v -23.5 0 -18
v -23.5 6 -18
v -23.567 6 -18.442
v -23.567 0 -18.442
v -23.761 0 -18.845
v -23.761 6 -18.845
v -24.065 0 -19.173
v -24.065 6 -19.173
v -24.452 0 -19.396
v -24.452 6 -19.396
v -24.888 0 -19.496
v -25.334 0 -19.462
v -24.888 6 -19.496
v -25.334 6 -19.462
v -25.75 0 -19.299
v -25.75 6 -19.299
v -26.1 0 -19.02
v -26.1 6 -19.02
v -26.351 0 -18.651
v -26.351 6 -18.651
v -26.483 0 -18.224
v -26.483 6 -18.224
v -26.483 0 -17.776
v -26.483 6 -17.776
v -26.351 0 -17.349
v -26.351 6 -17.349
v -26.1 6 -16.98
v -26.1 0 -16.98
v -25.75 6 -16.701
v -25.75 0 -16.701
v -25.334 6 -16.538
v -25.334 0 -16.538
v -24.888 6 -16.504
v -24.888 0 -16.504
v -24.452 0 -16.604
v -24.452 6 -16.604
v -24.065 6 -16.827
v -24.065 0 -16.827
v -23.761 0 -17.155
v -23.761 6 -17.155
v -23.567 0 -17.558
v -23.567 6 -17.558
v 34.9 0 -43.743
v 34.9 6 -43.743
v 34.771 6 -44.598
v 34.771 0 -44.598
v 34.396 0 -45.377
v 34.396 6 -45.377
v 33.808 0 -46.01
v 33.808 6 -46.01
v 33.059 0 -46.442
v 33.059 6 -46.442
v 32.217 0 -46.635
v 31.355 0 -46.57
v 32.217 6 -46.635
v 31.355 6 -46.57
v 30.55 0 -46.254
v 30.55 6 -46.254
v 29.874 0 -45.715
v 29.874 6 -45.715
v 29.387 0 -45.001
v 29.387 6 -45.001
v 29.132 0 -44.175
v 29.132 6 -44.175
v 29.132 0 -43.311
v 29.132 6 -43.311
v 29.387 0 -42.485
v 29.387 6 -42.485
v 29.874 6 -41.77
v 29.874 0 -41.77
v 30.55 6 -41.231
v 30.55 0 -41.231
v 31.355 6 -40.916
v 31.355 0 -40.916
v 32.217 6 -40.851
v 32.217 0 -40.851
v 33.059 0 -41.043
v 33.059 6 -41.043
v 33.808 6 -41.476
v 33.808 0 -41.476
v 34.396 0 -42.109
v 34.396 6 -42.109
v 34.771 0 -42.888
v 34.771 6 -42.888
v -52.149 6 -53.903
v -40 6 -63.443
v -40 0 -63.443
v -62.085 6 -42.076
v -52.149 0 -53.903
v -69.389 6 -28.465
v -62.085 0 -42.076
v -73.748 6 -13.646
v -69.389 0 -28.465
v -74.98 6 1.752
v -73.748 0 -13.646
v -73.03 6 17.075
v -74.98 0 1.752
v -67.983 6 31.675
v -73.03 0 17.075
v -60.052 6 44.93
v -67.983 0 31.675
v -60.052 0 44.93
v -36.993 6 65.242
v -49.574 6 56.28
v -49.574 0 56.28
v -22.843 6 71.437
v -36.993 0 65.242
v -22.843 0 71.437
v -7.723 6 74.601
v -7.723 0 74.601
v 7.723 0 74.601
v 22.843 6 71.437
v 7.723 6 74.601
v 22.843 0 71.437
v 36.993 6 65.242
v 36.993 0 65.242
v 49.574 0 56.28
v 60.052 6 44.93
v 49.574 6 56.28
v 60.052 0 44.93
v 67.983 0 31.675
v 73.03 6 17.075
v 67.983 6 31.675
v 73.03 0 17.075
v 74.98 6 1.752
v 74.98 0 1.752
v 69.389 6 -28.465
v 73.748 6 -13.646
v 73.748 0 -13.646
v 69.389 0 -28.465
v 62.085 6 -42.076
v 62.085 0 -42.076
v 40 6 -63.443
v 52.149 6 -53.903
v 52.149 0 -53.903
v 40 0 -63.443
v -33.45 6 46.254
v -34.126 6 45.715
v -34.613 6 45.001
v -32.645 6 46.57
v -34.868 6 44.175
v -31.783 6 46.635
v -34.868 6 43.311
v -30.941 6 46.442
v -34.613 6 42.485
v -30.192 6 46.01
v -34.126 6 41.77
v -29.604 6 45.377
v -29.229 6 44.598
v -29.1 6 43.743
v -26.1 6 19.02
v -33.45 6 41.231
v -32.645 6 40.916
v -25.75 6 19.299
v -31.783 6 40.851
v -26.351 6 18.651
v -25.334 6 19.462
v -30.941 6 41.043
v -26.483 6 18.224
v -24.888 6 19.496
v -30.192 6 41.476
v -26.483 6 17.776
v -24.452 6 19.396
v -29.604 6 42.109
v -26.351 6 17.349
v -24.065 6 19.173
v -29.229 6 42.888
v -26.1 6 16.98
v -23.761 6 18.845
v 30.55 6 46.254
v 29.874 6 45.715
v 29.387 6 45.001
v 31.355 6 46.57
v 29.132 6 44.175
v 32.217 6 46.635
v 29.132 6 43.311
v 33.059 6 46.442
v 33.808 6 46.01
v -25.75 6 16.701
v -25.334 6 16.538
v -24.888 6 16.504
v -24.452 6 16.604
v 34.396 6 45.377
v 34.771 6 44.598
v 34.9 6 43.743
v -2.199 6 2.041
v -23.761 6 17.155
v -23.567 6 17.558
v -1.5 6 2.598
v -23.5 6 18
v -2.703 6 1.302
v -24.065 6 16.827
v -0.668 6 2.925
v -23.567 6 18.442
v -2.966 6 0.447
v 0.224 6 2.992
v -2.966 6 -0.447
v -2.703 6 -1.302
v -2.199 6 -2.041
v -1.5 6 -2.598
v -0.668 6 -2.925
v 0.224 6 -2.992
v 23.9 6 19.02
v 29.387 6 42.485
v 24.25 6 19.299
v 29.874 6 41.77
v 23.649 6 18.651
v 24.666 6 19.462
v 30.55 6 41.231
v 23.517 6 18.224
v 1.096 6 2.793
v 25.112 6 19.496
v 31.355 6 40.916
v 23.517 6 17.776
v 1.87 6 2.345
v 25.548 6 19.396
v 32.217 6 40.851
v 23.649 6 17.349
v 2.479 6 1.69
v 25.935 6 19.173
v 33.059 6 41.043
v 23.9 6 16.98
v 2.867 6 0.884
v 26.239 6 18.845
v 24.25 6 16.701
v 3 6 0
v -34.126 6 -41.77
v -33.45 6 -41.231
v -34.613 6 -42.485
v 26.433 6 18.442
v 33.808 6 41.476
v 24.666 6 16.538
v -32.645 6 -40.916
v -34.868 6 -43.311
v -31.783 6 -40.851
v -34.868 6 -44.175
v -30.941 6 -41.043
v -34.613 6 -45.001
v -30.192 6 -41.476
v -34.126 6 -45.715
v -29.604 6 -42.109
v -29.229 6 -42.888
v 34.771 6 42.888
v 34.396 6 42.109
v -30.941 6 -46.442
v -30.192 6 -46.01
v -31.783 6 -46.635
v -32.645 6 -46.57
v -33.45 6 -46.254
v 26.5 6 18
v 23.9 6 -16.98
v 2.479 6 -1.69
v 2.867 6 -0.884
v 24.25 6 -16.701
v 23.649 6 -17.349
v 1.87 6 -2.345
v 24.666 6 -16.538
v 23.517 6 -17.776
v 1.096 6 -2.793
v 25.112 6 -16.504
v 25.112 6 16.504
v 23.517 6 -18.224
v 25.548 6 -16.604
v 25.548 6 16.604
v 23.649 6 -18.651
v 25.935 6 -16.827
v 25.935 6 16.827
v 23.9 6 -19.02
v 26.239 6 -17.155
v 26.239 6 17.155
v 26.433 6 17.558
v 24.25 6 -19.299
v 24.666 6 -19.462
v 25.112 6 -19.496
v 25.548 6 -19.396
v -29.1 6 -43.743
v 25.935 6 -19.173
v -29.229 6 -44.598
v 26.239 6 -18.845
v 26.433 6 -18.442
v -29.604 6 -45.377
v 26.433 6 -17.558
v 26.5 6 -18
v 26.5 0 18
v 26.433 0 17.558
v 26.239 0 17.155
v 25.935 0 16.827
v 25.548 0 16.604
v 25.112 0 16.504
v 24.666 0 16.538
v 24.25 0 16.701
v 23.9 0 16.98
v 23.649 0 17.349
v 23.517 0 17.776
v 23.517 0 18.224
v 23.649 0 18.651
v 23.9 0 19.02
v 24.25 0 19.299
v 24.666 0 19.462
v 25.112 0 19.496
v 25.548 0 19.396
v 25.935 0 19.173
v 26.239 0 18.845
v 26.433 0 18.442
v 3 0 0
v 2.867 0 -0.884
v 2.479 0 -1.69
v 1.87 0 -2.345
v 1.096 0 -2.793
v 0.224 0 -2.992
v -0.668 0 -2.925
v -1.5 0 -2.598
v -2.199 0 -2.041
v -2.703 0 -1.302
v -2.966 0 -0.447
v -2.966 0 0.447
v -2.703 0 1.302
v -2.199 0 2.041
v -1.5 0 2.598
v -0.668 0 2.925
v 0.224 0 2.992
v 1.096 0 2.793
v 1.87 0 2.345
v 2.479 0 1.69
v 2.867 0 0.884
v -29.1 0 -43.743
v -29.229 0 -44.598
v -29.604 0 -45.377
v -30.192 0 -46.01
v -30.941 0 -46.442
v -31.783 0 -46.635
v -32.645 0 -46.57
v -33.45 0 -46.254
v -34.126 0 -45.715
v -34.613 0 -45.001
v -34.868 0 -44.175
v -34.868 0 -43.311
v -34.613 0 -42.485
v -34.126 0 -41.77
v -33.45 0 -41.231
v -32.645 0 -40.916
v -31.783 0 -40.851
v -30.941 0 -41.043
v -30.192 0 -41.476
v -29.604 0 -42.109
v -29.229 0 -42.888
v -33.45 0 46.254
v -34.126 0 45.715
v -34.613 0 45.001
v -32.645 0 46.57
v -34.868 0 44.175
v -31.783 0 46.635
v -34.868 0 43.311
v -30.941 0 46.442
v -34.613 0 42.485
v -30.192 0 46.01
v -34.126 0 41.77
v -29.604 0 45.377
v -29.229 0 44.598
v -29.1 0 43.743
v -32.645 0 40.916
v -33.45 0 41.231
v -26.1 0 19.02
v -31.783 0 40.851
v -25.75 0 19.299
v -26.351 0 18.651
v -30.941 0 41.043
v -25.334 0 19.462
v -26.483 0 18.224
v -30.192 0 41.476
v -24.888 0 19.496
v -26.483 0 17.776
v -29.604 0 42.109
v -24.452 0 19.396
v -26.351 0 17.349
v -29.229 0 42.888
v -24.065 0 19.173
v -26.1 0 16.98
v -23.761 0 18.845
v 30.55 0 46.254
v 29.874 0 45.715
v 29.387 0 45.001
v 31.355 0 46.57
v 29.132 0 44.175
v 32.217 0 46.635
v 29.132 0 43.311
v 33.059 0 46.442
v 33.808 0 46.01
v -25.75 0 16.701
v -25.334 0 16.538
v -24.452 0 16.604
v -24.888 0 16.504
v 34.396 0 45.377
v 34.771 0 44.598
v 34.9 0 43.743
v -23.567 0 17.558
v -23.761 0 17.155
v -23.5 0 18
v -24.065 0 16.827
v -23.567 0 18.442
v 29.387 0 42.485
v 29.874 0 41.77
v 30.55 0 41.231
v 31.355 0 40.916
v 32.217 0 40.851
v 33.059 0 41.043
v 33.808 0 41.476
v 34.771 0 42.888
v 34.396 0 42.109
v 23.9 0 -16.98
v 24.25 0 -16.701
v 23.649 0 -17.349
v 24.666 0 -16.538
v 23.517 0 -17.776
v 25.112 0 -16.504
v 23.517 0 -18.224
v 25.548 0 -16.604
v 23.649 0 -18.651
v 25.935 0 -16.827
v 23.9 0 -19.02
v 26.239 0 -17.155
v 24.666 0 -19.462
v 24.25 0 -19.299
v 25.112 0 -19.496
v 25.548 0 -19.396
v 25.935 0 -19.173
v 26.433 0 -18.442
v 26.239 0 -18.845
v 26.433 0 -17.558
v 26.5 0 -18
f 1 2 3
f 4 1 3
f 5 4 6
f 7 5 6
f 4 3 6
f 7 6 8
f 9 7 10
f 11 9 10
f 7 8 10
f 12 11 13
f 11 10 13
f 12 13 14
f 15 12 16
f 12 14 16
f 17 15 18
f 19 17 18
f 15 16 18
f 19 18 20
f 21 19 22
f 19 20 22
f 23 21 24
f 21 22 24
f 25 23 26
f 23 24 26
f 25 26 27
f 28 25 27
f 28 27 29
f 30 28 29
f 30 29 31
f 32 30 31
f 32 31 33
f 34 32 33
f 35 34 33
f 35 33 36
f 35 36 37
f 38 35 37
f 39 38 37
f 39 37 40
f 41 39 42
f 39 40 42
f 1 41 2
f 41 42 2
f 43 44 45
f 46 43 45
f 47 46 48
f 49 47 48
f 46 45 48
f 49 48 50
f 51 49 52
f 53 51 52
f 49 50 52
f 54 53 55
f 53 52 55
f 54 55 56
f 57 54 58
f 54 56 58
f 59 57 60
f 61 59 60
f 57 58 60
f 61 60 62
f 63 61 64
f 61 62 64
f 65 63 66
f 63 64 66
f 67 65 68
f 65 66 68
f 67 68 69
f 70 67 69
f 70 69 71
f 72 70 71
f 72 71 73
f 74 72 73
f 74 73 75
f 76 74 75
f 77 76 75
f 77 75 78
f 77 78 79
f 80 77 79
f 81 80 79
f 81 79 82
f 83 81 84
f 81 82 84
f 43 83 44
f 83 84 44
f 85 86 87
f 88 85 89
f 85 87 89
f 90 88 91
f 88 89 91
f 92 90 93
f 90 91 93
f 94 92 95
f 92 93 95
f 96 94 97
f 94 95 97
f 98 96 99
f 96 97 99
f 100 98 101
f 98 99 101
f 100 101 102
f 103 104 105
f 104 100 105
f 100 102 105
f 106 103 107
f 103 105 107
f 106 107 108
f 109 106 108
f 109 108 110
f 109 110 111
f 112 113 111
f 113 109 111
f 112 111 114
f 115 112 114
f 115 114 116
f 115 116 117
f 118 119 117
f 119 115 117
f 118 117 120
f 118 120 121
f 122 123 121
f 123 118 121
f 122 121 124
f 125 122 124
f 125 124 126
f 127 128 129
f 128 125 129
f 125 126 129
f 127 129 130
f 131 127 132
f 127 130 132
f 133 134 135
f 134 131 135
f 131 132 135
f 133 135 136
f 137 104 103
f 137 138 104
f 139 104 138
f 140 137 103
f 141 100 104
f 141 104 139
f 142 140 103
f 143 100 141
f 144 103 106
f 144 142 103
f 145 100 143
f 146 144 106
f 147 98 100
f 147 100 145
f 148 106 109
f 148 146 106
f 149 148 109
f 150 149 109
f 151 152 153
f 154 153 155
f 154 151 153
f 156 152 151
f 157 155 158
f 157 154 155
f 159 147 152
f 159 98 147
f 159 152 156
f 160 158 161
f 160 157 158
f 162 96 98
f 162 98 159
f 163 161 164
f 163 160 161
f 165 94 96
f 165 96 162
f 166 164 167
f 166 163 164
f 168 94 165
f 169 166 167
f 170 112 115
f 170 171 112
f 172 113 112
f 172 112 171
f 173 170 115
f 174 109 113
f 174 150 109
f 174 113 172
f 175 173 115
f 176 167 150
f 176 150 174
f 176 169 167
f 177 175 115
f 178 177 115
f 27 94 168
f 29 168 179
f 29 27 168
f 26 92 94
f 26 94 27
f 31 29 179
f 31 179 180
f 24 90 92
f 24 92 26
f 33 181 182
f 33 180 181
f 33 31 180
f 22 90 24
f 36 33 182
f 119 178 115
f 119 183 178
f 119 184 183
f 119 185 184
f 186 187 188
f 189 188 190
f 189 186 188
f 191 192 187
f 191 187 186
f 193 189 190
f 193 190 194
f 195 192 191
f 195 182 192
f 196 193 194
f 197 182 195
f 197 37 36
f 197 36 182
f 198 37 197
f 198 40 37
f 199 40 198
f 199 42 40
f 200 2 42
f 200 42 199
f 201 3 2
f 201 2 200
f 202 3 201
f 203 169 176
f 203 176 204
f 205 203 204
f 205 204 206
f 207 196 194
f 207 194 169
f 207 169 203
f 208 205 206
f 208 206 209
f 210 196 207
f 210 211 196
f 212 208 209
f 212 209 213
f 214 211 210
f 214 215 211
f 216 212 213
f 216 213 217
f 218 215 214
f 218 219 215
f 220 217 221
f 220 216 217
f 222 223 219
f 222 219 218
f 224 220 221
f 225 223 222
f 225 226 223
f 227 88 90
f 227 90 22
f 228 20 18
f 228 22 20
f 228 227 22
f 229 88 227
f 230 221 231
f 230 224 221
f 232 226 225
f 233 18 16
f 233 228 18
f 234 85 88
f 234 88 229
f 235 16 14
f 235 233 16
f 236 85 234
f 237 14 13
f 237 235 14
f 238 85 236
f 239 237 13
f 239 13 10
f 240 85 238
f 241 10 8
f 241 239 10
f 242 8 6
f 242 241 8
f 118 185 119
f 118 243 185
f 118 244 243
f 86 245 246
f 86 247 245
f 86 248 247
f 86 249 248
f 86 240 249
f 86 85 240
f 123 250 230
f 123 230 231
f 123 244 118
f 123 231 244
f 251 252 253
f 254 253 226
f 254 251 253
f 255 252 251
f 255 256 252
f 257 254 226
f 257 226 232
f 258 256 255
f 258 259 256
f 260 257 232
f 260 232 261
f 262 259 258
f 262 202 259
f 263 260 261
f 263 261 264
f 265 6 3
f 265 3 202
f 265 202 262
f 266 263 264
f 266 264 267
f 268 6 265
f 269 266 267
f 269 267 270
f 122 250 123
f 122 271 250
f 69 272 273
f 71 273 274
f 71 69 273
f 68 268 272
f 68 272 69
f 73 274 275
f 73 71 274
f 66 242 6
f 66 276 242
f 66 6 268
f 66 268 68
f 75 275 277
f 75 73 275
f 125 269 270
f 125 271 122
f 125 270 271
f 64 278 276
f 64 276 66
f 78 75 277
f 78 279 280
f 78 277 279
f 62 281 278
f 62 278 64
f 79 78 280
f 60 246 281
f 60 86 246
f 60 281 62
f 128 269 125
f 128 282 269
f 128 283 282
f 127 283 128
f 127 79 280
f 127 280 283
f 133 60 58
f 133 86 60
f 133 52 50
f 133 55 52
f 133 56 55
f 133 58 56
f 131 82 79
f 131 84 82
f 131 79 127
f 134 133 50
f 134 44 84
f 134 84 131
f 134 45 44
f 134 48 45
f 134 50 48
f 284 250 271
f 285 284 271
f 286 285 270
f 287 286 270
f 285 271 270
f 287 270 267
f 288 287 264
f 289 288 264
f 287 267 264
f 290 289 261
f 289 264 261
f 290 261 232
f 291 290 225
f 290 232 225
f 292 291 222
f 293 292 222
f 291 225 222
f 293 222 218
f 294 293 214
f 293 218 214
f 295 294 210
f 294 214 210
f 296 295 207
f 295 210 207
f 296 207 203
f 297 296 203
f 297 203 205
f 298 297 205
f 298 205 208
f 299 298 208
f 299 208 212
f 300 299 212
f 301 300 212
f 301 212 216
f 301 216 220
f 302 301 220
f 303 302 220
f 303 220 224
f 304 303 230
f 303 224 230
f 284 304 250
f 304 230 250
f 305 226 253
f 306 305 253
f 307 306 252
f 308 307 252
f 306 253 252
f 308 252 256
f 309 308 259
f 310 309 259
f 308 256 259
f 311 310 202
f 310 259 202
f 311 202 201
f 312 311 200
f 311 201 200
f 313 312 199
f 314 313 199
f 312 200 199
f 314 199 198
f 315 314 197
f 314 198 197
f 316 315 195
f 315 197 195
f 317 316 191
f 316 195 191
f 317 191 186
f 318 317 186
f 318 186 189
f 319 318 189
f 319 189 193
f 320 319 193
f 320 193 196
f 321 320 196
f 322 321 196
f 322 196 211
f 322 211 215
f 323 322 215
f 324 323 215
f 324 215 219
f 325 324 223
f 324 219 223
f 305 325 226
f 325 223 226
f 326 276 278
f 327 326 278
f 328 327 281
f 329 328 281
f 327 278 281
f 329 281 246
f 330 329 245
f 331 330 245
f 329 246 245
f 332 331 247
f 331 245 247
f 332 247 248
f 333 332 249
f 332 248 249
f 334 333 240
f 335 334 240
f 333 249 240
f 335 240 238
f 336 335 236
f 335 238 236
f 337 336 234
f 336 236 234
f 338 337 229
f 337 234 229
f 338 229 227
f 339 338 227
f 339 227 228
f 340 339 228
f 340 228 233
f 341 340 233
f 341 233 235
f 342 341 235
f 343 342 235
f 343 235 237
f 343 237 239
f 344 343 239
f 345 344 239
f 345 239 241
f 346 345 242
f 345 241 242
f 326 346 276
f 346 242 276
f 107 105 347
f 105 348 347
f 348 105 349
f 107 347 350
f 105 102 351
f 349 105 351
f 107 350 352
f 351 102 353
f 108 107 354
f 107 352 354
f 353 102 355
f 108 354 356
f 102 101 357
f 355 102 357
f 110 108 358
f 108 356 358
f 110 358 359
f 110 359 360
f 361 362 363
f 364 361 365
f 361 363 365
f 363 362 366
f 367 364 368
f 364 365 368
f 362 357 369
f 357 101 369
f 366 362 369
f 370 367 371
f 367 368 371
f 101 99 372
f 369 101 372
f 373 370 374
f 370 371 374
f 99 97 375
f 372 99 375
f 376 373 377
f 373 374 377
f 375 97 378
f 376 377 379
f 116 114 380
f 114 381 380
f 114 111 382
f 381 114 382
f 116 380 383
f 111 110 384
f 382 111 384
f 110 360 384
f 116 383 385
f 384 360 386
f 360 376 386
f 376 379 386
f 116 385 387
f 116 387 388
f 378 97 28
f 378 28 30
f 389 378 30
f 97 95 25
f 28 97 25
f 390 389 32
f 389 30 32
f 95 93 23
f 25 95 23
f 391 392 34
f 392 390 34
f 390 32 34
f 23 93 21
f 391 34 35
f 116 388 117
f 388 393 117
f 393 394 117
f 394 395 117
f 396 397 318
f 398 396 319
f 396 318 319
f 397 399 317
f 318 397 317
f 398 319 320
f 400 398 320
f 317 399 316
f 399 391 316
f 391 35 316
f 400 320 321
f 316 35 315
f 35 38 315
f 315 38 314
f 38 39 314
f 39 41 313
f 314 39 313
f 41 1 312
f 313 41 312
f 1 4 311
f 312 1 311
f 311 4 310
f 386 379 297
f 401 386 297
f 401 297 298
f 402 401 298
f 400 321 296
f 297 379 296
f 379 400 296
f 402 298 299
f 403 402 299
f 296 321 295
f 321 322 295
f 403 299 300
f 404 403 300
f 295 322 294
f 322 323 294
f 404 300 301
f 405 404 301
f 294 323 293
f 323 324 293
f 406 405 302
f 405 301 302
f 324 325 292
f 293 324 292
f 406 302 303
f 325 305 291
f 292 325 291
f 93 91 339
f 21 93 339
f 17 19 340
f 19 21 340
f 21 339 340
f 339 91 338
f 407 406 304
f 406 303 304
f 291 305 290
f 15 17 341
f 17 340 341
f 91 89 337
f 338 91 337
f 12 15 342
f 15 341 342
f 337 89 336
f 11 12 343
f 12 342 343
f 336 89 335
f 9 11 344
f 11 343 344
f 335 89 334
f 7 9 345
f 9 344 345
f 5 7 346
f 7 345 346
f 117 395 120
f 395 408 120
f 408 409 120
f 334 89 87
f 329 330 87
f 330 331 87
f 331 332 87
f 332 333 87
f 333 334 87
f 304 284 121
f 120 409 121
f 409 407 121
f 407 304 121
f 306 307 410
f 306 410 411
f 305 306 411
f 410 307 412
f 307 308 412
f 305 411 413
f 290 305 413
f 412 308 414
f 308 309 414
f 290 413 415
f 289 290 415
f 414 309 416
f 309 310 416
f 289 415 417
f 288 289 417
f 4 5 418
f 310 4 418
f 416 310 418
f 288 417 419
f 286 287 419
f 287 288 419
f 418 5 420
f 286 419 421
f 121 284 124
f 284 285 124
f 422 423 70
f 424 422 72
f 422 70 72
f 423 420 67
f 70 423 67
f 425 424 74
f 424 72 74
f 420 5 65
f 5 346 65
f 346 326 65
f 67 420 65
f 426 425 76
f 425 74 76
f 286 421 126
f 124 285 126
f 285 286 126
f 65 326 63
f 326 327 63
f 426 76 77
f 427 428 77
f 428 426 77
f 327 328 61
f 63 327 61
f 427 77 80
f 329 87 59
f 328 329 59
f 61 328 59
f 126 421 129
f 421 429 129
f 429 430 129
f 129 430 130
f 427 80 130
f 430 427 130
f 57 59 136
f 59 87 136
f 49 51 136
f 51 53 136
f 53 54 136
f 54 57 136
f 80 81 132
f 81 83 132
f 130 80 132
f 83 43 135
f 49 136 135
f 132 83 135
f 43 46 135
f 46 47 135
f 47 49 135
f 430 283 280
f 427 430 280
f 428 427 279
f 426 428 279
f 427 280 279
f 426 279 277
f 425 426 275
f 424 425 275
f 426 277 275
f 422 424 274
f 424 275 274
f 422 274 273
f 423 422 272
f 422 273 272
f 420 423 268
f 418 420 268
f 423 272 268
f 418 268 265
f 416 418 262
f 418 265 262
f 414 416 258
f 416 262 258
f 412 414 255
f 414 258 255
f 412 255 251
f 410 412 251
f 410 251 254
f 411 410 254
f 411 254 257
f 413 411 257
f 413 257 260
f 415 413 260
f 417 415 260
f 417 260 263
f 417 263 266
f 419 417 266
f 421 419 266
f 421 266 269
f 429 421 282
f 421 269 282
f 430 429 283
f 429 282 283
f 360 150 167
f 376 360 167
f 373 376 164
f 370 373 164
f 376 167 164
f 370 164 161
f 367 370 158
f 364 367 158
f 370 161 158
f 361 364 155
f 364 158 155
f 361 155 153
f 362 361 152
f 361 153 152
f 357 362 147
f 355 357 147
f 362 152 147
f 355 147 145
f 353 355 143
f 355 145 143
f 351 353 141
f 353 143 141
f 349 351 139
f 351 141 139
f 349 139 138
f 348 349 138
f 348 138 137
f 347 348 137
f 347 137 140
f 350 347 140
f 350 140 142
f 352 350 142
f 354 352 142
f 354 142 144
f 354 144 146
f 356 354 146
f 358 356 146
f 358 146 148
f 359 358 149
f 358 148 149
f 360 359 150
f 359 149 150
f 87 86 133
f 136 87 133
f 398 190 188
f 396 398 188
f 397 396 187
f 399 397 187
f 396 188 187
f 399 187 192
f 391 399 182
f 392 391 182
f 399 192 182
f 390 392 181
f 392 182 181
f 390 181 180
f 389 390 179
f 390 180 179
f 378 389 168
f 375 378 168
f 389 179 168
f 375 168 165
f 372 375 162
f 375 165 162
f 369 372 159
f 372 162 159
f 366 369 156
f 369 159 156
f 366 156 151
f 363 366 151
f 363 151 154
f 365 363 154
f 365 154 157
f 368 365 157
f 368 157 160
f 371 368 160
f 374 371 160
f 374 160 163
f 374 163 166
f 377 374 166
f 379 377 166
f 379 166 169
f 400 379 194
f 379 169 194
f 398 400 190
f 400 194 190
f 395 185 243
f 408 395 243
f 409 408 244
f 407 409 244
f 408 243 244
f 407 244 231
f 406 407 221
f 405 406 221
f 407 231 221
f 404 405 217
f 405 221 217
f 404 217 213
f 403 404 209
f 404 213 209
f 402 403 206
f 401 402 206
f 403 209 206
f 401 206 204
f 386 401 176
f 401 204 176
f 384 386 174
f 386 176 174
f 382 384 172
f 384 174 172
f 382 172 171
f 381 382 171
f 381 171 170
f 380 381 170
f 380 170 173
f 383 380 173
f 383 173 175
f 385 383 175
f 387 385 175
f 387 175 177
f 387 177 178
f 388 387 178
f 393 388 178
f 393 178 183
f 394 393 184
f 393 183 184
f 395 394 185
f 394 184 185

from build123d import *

# Parameters (mm, degrees)
SKETCH1_R           = 75
BOSS_EXTRUDE1_DEPTH = 6
SKETCH2_R           = 2.9
SKETCH2_R_2         = 3
SKETCH2_R_3         = 1.5
SKETCH2_W           = 80
SKETCH2_H           = 23.30375559
CUT_EXTRUDE1_DEPTH  = 6


with BuildPart() as part:
    # Sketch1 → Boss-Extrude1 (new body)
    with BuildSketch(Plane(origin=(0, 0, 0), x_dir=(1, 0, 0), z_dir=(0, 1, 0))):
        Circle(SKETCH1_R)
    extrude(amount=BOSS_EXTRUDE1_DEPTH)

    # Sketch2 → Cut-Extrude1 (cut)
    with BuildSketch(Plane(origin=(0, 6, 0), x_dir=(1, 0, 0), z_dir=(0, 1, 0))):
        with Locations((-32, 43.742887702)):
            Circle(SKETCH2_R)
        with Locations((32, 43.742887702)):
            Circle(SKETCH2_R)
        Circle(SKETCH2_R_2)
        with Locations((-32, -43.742887702)):
            Circle(SKETCH2_R)
        with Locations((32, -43.742887702)):
            Circle(SKETCH2_R)
        with Locations((25, 18)):
            Circle(SKETCH2_R_3)
        with Locations((-25, 18)):
            Circle(SKETCH2_R_3)
        with Locations((-25, -18)):
            Circle(SKETCH2_R_3)
        with Locations((25, -18)):
            Circle(SKETCH2_R_3)
        with Locations((0, 75.094765497)):
            Rectangle(SKETCH2_W, SKETCH2_H)
    extrude(amount=-CUT_EXTRUDE1_DEPTH, mode=Mode.SUBTRACT)


solid = part.part
